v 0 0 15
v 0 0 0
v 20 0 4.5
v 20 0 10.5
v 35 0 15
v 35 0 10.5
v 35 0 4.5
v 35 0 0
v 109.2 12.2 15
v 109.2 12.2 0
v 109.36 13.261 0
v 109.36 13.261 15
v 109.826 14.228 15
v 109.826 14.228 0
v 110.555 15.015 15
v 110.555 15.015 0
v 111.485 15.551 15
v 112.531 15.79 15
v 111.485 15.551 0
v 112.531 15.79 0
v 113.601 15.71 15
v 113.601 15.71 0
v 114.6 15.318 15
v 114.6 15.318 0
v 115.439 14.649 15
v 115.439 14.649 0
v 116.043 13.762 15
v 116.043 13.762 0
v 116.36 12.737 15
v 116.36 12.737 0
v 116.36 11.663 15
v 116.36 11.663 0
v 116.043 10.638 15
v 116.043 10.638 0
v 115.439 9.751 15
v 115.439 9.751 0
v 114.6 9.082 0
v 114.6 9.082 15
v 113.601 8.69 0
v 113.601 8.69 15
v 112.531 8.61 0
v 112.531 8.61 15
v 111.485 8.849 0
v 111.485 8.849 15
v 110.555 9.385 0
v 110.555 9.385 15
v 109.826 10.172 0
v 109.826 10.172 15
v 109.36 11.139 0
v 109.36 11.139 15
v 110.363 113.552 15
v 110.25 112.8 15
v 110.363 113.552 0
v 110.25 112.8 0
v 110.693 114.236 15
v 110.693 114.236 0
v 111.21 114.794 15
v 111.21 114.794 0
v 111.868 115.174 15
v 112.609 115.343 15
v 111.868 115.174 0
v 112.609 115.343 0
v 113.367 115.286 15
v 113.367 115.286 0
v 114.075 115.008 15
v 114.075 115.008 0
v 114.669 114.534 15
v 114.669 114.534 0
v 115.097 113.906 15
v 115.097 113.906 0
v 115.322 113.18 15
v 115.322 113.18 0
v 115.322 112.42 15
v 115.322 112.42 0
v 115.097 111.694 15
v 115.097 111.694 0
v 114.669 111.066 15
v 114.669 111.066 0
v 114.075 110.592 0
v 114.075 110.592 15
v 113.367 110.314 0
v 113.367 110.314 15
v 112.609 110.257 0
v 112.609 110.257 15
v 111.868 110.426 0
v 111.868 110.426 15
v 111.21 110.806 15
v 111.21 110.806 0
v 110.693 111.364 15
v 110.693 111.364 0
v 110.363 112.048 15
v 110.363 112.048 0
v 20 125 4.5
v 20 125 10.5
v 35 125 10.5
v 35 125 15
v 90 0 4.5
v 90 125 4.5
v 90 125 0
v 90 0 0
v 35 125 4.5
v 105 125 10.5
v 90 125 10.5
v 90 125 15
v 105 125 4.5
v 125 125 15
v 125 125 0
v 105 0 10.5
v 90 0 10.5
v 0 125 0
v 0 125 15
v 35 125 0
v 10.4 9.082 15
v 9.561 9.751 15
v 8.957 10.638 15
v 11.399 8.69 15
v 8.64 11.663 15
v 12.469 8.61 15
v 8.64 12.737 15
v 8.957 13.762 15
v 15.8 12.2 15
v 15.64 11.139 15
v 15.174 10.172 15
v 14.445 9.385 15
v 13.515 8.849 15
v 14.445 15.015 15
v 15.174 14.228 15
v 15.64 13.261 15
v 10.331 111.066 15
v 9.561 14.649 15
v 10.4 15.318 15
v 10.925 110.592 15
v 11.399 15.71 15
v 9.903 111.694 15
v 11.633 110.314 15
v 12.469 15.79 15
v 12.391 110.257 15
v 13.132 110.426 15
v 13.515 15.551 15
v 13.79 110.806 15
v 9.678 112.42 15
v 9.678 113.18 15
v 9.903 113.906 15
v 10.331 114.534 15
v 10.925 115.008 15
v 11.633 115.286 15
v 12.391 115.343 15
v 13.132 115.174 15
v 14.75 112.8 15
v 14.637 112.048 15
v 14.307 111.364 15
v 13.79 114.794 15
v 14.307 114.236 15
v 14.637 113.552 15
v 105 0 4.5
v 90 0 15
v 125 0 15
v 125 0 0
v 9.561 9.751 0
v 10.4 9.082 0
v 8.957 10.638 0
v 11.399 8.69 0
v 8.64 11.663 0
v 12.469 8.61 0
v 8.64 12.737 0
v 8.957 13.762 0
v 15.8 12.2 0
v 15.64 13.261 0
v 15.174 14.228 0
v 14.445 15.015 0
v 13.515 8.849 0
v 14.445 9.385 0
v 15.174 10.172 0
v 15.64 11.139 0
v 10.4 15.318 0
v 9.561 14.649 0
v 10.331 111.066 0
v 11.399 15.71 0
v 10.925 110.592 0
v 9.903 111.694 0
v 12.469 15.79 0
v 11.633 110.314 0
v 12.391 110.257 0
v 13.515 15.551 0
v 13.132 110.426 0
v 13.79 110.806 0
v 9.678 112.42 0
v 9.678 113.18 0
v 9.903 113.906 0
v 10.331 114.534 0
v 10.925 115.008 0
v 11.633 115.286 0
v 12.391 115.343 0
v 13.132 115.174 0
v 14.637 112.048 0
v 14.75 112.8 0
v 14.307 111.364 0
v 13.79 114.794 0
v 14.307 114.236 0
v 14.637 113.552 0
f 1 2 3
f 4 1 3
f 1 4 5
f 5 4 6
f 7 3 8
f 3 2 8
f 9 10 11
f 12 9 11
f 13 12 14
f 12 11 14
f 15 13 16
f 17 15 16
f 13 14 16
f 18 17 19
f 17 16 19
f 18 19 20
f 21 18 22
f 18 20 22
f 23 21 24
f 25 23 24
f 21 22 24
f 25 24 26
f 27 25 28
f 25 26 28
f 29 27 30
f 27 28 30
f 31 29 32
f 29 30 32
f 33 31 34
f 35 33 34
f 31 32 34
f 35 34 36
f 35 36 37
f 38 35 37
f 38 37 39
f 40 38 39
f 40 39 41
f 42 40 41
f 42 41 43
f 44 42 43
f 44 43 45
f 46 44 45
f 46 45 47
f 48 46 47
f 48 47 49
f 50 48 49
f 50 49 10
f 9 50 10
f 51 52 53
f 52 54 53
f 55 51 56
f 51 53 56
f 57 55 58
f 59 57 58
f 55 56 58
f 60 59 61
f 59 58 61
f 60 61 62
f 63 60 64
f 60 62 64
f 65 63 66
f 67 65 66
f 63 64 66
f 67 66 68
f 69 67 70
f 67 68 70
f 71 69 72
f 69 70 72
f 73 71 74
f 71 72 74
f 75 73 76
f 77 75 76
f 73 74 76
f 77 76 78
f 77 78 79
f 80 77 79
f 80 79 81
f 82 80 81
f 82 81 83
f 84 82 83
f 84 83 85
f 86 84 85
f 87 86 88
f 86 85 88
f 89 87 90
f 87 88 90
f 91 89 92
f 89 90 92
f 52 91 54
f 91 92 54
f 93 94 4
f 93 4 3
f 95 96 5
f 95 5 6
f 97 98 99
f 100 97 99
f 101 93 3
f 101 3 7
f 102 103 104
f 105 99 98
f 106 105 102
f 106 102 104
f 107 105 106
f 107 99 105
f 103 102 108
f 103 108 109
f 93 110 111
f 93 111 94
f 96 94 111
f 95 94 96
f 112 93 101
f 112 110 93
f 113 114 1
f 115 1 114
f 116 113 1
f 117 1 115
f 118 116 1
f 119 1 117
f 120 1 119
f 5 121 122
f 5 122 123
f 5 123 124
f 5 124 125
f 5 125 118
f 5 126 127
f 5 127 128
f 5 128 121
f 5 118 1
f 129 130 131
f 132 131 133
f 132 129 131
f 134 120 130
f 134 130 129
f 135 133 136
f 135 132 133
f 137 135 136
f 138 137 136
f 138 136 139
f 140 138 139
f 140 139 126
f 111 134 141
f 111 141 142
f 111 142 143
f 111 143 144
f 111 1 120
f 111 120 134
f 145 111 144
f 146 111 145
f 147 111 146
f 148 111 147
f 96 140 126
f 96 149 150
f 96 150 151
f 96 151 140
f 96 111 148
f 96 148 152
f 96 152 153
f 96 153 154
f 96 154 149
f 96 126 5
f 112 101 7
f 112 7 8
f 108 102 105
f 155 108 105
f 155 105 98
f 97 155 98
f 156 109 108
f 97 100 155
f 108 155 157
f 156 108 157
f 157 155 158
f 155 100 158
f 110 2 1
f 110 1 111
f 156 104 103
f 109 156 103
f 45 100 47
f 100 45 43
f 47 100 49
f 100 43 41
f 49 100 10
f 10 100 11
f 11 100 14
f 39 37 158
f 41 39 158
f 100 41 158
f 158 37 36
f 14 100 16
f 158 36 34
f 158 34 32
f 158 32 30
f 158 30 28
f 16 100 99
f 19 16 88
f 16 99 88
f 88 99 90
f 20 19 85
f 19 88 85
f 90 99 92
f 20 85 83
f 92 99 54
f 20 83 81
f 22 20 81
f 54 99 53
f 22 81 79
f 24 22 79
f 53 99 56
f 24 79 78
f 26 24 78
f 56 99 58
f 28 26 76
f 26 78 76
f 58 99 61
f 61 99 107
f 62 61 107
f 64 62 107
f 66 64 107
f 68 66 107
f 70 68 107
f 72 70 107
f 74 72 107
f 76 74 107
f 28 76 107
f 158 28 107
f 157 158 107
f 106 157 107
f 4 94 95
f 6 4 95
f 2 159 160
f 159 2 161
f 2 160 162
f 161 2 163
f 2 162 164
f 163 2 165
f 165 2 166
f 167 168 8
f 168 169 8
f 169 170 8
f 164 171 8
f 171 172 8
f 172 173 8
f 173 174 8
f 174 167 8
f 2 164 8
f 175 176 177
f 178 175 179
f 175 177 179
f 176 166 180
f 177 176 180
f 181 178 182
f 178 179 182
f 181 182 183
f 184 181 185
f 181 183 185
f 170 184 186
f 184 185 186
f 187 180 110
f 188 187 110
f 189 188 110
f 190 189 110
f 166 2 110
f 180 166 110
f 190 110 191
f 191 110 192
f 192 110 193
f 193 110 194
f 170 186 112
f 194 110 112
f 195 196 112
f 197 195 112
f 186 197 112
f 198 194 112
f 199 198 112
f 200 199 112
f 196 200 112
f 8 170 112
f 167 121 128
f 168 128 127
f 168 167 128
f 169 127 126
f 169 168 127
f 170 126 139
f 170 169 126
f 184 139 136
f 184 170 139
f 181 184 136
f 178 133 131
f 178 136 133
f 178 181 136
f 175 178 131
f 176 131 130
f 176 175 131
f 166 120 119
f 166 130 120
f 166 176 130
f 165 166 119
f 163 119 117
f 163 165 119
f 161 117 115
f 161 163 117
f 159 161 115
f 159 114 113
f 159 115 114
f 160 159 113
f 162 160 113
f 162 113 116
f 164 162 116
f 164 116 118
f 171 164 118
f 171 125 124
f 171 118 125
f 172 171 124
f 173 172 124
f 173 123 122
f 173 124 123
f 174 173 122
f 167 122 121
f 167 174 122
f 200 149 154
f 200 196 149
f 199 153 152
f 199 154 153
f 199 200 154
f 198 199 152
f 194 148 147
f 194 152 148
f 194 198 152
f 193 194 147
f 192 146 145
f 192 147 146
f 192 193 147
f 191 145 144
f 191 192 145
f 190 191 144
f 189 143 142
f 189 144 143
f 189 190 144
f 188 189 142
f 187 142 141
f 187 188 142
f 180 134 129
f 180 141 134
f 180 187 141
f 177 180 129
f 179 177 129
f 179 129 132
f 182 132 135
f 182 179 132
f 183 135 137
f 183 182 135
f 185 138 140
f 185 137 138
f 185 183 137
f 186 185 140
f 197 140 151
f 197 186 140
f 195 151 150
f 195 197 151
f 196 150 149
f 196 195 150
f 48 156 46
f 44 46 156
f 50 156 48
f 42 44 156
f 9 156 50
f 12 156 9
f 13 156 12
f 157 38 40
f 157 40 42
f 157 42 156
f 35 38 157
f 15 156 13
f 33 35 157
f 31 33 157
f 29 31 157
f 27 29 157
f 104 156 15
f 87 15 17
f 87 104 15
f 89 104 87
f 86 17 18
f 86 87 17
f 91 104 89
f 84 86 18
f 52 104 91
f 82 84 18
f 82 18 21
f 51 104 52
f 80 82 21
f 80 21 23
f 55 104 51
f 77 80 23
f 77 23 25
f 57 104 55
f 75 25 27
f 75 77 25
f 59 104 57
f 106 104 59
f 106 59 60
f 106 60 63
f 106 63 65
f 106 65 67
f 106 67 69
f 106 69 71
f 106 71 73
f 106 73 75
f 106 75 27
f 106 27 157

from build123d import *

# Parameters (mm, degrees)
SKETCH1_W          = 125
SKETCH1_H          = 125
PLATE_DEPTH        = 15
SKETCH2_W          = 15
SKETCH2_H          = 6
CUT_EXTRUDE1_DEPTH = 178.411949992
SKETCH3_W          = 55
SKETCH3_H          = 15
CUT_EXTRUDE2_DEPTH = 178.411949992
SKETCH4_R          = 3.6
SKETCH4_R_2        = 2.55
CUT_EXTRUDE3_DEPTH = 178.411949992


with BuildPart() as part:
    # Sketch1 → Plate (new body)
    with BuildSketch(Plane.XY):
        with Locations((62.5, 62.5)):
            Rectangle(SKETCH1_W, SKETCH1_H)
    extrude(amount=PLATE_DEPTH)

    # Sketch2 → Cut-Extrude1 (cut, symmetric)
    with BuildSketch(Plane(origin=(0, 125, 0), x_dir=(1, 0, 0), z_dir=(0, 1, 0))):
        with Locations((27.5, -7.5)):
            Rectangle(SKETCH2_W, SKETCH2_H)
    cut_extrude1 = extrude(amount=CUT_EXTRUDE1_DEPTH, both=True, mode=Mode.SUBTRACT)

    # Mirror1: Cut-Extrude1 across plane
    add(cut_extrude1.mirror(Plane(origin=(62.5, 0, 0), x_dir=(0, 0, 1), z_dir=(1, 0, 0))), mode=Mode.SUBTRACT)

    # Sketch3 → Cut-Extrude2 (cut, through all)
    with BuildSketch(Plane(origin=(0, 125, 0), x_dir=(1, 0, 0), z_dir=(0, 1, 0))):
        with Locations((62.5, -7.5)):
            Rectangle(SKETCH3_W, SKETCH3_H)
    extrude(amount=-CUT_EXTRUDE2_DEPTH, mode=Mode.SUBTRACT)


with BuildPart() as cut_extrude2_piece_1:
    # of the separate pieces the step leaves, piece 1, a body of its own (cut_extrude2_pieces)
    add(part.part.solids().sort_by_distance((0, 0, 0))[0])


with BuildPart() as cut_extrude2_piece_2:
    # of the separate pieces the step leaves, piece 2, a body of its own (cut_extrude2_pieces)
    add(part.part.solids().sort_by_distance((90, 0, 0))[0])

    # Sketch4 → Cut-Extrude3 (cut, symmetric)
    with BuildSketch(Plane(origin=(0, 0, 0), x_dir=(-1, 0, 0), z_dir=(0, 0, -1))):
        with Locations((-112.8, 12.2)):
            Circle(SKETCH4_R)
        with Locations((-112.8, 112.8)):
            Circle(SKETCH4_R_2)
    cut_extrude3 = extrude(amount=CUT_EXTRUDE3_DEPTH, both=True, mode=Mode.SUBTRACT)


with BuildPart() as cut_extrude2_piece_1_1:
    add(cut_extrude2_piece_1.part)

    # Mirror2: Cut-Extrude3 across plane
    add(cut_extrude3.mirror(Plane(origin=(62.5, 0, 0), x_dir=(0, 0, 1), z_dir=(1, 0, 0))), mode=Mode.SUBTRACT)


solid = Compound([cut_extrude2_piece_2.part, cut_extrude2_piece_1_1.part])
